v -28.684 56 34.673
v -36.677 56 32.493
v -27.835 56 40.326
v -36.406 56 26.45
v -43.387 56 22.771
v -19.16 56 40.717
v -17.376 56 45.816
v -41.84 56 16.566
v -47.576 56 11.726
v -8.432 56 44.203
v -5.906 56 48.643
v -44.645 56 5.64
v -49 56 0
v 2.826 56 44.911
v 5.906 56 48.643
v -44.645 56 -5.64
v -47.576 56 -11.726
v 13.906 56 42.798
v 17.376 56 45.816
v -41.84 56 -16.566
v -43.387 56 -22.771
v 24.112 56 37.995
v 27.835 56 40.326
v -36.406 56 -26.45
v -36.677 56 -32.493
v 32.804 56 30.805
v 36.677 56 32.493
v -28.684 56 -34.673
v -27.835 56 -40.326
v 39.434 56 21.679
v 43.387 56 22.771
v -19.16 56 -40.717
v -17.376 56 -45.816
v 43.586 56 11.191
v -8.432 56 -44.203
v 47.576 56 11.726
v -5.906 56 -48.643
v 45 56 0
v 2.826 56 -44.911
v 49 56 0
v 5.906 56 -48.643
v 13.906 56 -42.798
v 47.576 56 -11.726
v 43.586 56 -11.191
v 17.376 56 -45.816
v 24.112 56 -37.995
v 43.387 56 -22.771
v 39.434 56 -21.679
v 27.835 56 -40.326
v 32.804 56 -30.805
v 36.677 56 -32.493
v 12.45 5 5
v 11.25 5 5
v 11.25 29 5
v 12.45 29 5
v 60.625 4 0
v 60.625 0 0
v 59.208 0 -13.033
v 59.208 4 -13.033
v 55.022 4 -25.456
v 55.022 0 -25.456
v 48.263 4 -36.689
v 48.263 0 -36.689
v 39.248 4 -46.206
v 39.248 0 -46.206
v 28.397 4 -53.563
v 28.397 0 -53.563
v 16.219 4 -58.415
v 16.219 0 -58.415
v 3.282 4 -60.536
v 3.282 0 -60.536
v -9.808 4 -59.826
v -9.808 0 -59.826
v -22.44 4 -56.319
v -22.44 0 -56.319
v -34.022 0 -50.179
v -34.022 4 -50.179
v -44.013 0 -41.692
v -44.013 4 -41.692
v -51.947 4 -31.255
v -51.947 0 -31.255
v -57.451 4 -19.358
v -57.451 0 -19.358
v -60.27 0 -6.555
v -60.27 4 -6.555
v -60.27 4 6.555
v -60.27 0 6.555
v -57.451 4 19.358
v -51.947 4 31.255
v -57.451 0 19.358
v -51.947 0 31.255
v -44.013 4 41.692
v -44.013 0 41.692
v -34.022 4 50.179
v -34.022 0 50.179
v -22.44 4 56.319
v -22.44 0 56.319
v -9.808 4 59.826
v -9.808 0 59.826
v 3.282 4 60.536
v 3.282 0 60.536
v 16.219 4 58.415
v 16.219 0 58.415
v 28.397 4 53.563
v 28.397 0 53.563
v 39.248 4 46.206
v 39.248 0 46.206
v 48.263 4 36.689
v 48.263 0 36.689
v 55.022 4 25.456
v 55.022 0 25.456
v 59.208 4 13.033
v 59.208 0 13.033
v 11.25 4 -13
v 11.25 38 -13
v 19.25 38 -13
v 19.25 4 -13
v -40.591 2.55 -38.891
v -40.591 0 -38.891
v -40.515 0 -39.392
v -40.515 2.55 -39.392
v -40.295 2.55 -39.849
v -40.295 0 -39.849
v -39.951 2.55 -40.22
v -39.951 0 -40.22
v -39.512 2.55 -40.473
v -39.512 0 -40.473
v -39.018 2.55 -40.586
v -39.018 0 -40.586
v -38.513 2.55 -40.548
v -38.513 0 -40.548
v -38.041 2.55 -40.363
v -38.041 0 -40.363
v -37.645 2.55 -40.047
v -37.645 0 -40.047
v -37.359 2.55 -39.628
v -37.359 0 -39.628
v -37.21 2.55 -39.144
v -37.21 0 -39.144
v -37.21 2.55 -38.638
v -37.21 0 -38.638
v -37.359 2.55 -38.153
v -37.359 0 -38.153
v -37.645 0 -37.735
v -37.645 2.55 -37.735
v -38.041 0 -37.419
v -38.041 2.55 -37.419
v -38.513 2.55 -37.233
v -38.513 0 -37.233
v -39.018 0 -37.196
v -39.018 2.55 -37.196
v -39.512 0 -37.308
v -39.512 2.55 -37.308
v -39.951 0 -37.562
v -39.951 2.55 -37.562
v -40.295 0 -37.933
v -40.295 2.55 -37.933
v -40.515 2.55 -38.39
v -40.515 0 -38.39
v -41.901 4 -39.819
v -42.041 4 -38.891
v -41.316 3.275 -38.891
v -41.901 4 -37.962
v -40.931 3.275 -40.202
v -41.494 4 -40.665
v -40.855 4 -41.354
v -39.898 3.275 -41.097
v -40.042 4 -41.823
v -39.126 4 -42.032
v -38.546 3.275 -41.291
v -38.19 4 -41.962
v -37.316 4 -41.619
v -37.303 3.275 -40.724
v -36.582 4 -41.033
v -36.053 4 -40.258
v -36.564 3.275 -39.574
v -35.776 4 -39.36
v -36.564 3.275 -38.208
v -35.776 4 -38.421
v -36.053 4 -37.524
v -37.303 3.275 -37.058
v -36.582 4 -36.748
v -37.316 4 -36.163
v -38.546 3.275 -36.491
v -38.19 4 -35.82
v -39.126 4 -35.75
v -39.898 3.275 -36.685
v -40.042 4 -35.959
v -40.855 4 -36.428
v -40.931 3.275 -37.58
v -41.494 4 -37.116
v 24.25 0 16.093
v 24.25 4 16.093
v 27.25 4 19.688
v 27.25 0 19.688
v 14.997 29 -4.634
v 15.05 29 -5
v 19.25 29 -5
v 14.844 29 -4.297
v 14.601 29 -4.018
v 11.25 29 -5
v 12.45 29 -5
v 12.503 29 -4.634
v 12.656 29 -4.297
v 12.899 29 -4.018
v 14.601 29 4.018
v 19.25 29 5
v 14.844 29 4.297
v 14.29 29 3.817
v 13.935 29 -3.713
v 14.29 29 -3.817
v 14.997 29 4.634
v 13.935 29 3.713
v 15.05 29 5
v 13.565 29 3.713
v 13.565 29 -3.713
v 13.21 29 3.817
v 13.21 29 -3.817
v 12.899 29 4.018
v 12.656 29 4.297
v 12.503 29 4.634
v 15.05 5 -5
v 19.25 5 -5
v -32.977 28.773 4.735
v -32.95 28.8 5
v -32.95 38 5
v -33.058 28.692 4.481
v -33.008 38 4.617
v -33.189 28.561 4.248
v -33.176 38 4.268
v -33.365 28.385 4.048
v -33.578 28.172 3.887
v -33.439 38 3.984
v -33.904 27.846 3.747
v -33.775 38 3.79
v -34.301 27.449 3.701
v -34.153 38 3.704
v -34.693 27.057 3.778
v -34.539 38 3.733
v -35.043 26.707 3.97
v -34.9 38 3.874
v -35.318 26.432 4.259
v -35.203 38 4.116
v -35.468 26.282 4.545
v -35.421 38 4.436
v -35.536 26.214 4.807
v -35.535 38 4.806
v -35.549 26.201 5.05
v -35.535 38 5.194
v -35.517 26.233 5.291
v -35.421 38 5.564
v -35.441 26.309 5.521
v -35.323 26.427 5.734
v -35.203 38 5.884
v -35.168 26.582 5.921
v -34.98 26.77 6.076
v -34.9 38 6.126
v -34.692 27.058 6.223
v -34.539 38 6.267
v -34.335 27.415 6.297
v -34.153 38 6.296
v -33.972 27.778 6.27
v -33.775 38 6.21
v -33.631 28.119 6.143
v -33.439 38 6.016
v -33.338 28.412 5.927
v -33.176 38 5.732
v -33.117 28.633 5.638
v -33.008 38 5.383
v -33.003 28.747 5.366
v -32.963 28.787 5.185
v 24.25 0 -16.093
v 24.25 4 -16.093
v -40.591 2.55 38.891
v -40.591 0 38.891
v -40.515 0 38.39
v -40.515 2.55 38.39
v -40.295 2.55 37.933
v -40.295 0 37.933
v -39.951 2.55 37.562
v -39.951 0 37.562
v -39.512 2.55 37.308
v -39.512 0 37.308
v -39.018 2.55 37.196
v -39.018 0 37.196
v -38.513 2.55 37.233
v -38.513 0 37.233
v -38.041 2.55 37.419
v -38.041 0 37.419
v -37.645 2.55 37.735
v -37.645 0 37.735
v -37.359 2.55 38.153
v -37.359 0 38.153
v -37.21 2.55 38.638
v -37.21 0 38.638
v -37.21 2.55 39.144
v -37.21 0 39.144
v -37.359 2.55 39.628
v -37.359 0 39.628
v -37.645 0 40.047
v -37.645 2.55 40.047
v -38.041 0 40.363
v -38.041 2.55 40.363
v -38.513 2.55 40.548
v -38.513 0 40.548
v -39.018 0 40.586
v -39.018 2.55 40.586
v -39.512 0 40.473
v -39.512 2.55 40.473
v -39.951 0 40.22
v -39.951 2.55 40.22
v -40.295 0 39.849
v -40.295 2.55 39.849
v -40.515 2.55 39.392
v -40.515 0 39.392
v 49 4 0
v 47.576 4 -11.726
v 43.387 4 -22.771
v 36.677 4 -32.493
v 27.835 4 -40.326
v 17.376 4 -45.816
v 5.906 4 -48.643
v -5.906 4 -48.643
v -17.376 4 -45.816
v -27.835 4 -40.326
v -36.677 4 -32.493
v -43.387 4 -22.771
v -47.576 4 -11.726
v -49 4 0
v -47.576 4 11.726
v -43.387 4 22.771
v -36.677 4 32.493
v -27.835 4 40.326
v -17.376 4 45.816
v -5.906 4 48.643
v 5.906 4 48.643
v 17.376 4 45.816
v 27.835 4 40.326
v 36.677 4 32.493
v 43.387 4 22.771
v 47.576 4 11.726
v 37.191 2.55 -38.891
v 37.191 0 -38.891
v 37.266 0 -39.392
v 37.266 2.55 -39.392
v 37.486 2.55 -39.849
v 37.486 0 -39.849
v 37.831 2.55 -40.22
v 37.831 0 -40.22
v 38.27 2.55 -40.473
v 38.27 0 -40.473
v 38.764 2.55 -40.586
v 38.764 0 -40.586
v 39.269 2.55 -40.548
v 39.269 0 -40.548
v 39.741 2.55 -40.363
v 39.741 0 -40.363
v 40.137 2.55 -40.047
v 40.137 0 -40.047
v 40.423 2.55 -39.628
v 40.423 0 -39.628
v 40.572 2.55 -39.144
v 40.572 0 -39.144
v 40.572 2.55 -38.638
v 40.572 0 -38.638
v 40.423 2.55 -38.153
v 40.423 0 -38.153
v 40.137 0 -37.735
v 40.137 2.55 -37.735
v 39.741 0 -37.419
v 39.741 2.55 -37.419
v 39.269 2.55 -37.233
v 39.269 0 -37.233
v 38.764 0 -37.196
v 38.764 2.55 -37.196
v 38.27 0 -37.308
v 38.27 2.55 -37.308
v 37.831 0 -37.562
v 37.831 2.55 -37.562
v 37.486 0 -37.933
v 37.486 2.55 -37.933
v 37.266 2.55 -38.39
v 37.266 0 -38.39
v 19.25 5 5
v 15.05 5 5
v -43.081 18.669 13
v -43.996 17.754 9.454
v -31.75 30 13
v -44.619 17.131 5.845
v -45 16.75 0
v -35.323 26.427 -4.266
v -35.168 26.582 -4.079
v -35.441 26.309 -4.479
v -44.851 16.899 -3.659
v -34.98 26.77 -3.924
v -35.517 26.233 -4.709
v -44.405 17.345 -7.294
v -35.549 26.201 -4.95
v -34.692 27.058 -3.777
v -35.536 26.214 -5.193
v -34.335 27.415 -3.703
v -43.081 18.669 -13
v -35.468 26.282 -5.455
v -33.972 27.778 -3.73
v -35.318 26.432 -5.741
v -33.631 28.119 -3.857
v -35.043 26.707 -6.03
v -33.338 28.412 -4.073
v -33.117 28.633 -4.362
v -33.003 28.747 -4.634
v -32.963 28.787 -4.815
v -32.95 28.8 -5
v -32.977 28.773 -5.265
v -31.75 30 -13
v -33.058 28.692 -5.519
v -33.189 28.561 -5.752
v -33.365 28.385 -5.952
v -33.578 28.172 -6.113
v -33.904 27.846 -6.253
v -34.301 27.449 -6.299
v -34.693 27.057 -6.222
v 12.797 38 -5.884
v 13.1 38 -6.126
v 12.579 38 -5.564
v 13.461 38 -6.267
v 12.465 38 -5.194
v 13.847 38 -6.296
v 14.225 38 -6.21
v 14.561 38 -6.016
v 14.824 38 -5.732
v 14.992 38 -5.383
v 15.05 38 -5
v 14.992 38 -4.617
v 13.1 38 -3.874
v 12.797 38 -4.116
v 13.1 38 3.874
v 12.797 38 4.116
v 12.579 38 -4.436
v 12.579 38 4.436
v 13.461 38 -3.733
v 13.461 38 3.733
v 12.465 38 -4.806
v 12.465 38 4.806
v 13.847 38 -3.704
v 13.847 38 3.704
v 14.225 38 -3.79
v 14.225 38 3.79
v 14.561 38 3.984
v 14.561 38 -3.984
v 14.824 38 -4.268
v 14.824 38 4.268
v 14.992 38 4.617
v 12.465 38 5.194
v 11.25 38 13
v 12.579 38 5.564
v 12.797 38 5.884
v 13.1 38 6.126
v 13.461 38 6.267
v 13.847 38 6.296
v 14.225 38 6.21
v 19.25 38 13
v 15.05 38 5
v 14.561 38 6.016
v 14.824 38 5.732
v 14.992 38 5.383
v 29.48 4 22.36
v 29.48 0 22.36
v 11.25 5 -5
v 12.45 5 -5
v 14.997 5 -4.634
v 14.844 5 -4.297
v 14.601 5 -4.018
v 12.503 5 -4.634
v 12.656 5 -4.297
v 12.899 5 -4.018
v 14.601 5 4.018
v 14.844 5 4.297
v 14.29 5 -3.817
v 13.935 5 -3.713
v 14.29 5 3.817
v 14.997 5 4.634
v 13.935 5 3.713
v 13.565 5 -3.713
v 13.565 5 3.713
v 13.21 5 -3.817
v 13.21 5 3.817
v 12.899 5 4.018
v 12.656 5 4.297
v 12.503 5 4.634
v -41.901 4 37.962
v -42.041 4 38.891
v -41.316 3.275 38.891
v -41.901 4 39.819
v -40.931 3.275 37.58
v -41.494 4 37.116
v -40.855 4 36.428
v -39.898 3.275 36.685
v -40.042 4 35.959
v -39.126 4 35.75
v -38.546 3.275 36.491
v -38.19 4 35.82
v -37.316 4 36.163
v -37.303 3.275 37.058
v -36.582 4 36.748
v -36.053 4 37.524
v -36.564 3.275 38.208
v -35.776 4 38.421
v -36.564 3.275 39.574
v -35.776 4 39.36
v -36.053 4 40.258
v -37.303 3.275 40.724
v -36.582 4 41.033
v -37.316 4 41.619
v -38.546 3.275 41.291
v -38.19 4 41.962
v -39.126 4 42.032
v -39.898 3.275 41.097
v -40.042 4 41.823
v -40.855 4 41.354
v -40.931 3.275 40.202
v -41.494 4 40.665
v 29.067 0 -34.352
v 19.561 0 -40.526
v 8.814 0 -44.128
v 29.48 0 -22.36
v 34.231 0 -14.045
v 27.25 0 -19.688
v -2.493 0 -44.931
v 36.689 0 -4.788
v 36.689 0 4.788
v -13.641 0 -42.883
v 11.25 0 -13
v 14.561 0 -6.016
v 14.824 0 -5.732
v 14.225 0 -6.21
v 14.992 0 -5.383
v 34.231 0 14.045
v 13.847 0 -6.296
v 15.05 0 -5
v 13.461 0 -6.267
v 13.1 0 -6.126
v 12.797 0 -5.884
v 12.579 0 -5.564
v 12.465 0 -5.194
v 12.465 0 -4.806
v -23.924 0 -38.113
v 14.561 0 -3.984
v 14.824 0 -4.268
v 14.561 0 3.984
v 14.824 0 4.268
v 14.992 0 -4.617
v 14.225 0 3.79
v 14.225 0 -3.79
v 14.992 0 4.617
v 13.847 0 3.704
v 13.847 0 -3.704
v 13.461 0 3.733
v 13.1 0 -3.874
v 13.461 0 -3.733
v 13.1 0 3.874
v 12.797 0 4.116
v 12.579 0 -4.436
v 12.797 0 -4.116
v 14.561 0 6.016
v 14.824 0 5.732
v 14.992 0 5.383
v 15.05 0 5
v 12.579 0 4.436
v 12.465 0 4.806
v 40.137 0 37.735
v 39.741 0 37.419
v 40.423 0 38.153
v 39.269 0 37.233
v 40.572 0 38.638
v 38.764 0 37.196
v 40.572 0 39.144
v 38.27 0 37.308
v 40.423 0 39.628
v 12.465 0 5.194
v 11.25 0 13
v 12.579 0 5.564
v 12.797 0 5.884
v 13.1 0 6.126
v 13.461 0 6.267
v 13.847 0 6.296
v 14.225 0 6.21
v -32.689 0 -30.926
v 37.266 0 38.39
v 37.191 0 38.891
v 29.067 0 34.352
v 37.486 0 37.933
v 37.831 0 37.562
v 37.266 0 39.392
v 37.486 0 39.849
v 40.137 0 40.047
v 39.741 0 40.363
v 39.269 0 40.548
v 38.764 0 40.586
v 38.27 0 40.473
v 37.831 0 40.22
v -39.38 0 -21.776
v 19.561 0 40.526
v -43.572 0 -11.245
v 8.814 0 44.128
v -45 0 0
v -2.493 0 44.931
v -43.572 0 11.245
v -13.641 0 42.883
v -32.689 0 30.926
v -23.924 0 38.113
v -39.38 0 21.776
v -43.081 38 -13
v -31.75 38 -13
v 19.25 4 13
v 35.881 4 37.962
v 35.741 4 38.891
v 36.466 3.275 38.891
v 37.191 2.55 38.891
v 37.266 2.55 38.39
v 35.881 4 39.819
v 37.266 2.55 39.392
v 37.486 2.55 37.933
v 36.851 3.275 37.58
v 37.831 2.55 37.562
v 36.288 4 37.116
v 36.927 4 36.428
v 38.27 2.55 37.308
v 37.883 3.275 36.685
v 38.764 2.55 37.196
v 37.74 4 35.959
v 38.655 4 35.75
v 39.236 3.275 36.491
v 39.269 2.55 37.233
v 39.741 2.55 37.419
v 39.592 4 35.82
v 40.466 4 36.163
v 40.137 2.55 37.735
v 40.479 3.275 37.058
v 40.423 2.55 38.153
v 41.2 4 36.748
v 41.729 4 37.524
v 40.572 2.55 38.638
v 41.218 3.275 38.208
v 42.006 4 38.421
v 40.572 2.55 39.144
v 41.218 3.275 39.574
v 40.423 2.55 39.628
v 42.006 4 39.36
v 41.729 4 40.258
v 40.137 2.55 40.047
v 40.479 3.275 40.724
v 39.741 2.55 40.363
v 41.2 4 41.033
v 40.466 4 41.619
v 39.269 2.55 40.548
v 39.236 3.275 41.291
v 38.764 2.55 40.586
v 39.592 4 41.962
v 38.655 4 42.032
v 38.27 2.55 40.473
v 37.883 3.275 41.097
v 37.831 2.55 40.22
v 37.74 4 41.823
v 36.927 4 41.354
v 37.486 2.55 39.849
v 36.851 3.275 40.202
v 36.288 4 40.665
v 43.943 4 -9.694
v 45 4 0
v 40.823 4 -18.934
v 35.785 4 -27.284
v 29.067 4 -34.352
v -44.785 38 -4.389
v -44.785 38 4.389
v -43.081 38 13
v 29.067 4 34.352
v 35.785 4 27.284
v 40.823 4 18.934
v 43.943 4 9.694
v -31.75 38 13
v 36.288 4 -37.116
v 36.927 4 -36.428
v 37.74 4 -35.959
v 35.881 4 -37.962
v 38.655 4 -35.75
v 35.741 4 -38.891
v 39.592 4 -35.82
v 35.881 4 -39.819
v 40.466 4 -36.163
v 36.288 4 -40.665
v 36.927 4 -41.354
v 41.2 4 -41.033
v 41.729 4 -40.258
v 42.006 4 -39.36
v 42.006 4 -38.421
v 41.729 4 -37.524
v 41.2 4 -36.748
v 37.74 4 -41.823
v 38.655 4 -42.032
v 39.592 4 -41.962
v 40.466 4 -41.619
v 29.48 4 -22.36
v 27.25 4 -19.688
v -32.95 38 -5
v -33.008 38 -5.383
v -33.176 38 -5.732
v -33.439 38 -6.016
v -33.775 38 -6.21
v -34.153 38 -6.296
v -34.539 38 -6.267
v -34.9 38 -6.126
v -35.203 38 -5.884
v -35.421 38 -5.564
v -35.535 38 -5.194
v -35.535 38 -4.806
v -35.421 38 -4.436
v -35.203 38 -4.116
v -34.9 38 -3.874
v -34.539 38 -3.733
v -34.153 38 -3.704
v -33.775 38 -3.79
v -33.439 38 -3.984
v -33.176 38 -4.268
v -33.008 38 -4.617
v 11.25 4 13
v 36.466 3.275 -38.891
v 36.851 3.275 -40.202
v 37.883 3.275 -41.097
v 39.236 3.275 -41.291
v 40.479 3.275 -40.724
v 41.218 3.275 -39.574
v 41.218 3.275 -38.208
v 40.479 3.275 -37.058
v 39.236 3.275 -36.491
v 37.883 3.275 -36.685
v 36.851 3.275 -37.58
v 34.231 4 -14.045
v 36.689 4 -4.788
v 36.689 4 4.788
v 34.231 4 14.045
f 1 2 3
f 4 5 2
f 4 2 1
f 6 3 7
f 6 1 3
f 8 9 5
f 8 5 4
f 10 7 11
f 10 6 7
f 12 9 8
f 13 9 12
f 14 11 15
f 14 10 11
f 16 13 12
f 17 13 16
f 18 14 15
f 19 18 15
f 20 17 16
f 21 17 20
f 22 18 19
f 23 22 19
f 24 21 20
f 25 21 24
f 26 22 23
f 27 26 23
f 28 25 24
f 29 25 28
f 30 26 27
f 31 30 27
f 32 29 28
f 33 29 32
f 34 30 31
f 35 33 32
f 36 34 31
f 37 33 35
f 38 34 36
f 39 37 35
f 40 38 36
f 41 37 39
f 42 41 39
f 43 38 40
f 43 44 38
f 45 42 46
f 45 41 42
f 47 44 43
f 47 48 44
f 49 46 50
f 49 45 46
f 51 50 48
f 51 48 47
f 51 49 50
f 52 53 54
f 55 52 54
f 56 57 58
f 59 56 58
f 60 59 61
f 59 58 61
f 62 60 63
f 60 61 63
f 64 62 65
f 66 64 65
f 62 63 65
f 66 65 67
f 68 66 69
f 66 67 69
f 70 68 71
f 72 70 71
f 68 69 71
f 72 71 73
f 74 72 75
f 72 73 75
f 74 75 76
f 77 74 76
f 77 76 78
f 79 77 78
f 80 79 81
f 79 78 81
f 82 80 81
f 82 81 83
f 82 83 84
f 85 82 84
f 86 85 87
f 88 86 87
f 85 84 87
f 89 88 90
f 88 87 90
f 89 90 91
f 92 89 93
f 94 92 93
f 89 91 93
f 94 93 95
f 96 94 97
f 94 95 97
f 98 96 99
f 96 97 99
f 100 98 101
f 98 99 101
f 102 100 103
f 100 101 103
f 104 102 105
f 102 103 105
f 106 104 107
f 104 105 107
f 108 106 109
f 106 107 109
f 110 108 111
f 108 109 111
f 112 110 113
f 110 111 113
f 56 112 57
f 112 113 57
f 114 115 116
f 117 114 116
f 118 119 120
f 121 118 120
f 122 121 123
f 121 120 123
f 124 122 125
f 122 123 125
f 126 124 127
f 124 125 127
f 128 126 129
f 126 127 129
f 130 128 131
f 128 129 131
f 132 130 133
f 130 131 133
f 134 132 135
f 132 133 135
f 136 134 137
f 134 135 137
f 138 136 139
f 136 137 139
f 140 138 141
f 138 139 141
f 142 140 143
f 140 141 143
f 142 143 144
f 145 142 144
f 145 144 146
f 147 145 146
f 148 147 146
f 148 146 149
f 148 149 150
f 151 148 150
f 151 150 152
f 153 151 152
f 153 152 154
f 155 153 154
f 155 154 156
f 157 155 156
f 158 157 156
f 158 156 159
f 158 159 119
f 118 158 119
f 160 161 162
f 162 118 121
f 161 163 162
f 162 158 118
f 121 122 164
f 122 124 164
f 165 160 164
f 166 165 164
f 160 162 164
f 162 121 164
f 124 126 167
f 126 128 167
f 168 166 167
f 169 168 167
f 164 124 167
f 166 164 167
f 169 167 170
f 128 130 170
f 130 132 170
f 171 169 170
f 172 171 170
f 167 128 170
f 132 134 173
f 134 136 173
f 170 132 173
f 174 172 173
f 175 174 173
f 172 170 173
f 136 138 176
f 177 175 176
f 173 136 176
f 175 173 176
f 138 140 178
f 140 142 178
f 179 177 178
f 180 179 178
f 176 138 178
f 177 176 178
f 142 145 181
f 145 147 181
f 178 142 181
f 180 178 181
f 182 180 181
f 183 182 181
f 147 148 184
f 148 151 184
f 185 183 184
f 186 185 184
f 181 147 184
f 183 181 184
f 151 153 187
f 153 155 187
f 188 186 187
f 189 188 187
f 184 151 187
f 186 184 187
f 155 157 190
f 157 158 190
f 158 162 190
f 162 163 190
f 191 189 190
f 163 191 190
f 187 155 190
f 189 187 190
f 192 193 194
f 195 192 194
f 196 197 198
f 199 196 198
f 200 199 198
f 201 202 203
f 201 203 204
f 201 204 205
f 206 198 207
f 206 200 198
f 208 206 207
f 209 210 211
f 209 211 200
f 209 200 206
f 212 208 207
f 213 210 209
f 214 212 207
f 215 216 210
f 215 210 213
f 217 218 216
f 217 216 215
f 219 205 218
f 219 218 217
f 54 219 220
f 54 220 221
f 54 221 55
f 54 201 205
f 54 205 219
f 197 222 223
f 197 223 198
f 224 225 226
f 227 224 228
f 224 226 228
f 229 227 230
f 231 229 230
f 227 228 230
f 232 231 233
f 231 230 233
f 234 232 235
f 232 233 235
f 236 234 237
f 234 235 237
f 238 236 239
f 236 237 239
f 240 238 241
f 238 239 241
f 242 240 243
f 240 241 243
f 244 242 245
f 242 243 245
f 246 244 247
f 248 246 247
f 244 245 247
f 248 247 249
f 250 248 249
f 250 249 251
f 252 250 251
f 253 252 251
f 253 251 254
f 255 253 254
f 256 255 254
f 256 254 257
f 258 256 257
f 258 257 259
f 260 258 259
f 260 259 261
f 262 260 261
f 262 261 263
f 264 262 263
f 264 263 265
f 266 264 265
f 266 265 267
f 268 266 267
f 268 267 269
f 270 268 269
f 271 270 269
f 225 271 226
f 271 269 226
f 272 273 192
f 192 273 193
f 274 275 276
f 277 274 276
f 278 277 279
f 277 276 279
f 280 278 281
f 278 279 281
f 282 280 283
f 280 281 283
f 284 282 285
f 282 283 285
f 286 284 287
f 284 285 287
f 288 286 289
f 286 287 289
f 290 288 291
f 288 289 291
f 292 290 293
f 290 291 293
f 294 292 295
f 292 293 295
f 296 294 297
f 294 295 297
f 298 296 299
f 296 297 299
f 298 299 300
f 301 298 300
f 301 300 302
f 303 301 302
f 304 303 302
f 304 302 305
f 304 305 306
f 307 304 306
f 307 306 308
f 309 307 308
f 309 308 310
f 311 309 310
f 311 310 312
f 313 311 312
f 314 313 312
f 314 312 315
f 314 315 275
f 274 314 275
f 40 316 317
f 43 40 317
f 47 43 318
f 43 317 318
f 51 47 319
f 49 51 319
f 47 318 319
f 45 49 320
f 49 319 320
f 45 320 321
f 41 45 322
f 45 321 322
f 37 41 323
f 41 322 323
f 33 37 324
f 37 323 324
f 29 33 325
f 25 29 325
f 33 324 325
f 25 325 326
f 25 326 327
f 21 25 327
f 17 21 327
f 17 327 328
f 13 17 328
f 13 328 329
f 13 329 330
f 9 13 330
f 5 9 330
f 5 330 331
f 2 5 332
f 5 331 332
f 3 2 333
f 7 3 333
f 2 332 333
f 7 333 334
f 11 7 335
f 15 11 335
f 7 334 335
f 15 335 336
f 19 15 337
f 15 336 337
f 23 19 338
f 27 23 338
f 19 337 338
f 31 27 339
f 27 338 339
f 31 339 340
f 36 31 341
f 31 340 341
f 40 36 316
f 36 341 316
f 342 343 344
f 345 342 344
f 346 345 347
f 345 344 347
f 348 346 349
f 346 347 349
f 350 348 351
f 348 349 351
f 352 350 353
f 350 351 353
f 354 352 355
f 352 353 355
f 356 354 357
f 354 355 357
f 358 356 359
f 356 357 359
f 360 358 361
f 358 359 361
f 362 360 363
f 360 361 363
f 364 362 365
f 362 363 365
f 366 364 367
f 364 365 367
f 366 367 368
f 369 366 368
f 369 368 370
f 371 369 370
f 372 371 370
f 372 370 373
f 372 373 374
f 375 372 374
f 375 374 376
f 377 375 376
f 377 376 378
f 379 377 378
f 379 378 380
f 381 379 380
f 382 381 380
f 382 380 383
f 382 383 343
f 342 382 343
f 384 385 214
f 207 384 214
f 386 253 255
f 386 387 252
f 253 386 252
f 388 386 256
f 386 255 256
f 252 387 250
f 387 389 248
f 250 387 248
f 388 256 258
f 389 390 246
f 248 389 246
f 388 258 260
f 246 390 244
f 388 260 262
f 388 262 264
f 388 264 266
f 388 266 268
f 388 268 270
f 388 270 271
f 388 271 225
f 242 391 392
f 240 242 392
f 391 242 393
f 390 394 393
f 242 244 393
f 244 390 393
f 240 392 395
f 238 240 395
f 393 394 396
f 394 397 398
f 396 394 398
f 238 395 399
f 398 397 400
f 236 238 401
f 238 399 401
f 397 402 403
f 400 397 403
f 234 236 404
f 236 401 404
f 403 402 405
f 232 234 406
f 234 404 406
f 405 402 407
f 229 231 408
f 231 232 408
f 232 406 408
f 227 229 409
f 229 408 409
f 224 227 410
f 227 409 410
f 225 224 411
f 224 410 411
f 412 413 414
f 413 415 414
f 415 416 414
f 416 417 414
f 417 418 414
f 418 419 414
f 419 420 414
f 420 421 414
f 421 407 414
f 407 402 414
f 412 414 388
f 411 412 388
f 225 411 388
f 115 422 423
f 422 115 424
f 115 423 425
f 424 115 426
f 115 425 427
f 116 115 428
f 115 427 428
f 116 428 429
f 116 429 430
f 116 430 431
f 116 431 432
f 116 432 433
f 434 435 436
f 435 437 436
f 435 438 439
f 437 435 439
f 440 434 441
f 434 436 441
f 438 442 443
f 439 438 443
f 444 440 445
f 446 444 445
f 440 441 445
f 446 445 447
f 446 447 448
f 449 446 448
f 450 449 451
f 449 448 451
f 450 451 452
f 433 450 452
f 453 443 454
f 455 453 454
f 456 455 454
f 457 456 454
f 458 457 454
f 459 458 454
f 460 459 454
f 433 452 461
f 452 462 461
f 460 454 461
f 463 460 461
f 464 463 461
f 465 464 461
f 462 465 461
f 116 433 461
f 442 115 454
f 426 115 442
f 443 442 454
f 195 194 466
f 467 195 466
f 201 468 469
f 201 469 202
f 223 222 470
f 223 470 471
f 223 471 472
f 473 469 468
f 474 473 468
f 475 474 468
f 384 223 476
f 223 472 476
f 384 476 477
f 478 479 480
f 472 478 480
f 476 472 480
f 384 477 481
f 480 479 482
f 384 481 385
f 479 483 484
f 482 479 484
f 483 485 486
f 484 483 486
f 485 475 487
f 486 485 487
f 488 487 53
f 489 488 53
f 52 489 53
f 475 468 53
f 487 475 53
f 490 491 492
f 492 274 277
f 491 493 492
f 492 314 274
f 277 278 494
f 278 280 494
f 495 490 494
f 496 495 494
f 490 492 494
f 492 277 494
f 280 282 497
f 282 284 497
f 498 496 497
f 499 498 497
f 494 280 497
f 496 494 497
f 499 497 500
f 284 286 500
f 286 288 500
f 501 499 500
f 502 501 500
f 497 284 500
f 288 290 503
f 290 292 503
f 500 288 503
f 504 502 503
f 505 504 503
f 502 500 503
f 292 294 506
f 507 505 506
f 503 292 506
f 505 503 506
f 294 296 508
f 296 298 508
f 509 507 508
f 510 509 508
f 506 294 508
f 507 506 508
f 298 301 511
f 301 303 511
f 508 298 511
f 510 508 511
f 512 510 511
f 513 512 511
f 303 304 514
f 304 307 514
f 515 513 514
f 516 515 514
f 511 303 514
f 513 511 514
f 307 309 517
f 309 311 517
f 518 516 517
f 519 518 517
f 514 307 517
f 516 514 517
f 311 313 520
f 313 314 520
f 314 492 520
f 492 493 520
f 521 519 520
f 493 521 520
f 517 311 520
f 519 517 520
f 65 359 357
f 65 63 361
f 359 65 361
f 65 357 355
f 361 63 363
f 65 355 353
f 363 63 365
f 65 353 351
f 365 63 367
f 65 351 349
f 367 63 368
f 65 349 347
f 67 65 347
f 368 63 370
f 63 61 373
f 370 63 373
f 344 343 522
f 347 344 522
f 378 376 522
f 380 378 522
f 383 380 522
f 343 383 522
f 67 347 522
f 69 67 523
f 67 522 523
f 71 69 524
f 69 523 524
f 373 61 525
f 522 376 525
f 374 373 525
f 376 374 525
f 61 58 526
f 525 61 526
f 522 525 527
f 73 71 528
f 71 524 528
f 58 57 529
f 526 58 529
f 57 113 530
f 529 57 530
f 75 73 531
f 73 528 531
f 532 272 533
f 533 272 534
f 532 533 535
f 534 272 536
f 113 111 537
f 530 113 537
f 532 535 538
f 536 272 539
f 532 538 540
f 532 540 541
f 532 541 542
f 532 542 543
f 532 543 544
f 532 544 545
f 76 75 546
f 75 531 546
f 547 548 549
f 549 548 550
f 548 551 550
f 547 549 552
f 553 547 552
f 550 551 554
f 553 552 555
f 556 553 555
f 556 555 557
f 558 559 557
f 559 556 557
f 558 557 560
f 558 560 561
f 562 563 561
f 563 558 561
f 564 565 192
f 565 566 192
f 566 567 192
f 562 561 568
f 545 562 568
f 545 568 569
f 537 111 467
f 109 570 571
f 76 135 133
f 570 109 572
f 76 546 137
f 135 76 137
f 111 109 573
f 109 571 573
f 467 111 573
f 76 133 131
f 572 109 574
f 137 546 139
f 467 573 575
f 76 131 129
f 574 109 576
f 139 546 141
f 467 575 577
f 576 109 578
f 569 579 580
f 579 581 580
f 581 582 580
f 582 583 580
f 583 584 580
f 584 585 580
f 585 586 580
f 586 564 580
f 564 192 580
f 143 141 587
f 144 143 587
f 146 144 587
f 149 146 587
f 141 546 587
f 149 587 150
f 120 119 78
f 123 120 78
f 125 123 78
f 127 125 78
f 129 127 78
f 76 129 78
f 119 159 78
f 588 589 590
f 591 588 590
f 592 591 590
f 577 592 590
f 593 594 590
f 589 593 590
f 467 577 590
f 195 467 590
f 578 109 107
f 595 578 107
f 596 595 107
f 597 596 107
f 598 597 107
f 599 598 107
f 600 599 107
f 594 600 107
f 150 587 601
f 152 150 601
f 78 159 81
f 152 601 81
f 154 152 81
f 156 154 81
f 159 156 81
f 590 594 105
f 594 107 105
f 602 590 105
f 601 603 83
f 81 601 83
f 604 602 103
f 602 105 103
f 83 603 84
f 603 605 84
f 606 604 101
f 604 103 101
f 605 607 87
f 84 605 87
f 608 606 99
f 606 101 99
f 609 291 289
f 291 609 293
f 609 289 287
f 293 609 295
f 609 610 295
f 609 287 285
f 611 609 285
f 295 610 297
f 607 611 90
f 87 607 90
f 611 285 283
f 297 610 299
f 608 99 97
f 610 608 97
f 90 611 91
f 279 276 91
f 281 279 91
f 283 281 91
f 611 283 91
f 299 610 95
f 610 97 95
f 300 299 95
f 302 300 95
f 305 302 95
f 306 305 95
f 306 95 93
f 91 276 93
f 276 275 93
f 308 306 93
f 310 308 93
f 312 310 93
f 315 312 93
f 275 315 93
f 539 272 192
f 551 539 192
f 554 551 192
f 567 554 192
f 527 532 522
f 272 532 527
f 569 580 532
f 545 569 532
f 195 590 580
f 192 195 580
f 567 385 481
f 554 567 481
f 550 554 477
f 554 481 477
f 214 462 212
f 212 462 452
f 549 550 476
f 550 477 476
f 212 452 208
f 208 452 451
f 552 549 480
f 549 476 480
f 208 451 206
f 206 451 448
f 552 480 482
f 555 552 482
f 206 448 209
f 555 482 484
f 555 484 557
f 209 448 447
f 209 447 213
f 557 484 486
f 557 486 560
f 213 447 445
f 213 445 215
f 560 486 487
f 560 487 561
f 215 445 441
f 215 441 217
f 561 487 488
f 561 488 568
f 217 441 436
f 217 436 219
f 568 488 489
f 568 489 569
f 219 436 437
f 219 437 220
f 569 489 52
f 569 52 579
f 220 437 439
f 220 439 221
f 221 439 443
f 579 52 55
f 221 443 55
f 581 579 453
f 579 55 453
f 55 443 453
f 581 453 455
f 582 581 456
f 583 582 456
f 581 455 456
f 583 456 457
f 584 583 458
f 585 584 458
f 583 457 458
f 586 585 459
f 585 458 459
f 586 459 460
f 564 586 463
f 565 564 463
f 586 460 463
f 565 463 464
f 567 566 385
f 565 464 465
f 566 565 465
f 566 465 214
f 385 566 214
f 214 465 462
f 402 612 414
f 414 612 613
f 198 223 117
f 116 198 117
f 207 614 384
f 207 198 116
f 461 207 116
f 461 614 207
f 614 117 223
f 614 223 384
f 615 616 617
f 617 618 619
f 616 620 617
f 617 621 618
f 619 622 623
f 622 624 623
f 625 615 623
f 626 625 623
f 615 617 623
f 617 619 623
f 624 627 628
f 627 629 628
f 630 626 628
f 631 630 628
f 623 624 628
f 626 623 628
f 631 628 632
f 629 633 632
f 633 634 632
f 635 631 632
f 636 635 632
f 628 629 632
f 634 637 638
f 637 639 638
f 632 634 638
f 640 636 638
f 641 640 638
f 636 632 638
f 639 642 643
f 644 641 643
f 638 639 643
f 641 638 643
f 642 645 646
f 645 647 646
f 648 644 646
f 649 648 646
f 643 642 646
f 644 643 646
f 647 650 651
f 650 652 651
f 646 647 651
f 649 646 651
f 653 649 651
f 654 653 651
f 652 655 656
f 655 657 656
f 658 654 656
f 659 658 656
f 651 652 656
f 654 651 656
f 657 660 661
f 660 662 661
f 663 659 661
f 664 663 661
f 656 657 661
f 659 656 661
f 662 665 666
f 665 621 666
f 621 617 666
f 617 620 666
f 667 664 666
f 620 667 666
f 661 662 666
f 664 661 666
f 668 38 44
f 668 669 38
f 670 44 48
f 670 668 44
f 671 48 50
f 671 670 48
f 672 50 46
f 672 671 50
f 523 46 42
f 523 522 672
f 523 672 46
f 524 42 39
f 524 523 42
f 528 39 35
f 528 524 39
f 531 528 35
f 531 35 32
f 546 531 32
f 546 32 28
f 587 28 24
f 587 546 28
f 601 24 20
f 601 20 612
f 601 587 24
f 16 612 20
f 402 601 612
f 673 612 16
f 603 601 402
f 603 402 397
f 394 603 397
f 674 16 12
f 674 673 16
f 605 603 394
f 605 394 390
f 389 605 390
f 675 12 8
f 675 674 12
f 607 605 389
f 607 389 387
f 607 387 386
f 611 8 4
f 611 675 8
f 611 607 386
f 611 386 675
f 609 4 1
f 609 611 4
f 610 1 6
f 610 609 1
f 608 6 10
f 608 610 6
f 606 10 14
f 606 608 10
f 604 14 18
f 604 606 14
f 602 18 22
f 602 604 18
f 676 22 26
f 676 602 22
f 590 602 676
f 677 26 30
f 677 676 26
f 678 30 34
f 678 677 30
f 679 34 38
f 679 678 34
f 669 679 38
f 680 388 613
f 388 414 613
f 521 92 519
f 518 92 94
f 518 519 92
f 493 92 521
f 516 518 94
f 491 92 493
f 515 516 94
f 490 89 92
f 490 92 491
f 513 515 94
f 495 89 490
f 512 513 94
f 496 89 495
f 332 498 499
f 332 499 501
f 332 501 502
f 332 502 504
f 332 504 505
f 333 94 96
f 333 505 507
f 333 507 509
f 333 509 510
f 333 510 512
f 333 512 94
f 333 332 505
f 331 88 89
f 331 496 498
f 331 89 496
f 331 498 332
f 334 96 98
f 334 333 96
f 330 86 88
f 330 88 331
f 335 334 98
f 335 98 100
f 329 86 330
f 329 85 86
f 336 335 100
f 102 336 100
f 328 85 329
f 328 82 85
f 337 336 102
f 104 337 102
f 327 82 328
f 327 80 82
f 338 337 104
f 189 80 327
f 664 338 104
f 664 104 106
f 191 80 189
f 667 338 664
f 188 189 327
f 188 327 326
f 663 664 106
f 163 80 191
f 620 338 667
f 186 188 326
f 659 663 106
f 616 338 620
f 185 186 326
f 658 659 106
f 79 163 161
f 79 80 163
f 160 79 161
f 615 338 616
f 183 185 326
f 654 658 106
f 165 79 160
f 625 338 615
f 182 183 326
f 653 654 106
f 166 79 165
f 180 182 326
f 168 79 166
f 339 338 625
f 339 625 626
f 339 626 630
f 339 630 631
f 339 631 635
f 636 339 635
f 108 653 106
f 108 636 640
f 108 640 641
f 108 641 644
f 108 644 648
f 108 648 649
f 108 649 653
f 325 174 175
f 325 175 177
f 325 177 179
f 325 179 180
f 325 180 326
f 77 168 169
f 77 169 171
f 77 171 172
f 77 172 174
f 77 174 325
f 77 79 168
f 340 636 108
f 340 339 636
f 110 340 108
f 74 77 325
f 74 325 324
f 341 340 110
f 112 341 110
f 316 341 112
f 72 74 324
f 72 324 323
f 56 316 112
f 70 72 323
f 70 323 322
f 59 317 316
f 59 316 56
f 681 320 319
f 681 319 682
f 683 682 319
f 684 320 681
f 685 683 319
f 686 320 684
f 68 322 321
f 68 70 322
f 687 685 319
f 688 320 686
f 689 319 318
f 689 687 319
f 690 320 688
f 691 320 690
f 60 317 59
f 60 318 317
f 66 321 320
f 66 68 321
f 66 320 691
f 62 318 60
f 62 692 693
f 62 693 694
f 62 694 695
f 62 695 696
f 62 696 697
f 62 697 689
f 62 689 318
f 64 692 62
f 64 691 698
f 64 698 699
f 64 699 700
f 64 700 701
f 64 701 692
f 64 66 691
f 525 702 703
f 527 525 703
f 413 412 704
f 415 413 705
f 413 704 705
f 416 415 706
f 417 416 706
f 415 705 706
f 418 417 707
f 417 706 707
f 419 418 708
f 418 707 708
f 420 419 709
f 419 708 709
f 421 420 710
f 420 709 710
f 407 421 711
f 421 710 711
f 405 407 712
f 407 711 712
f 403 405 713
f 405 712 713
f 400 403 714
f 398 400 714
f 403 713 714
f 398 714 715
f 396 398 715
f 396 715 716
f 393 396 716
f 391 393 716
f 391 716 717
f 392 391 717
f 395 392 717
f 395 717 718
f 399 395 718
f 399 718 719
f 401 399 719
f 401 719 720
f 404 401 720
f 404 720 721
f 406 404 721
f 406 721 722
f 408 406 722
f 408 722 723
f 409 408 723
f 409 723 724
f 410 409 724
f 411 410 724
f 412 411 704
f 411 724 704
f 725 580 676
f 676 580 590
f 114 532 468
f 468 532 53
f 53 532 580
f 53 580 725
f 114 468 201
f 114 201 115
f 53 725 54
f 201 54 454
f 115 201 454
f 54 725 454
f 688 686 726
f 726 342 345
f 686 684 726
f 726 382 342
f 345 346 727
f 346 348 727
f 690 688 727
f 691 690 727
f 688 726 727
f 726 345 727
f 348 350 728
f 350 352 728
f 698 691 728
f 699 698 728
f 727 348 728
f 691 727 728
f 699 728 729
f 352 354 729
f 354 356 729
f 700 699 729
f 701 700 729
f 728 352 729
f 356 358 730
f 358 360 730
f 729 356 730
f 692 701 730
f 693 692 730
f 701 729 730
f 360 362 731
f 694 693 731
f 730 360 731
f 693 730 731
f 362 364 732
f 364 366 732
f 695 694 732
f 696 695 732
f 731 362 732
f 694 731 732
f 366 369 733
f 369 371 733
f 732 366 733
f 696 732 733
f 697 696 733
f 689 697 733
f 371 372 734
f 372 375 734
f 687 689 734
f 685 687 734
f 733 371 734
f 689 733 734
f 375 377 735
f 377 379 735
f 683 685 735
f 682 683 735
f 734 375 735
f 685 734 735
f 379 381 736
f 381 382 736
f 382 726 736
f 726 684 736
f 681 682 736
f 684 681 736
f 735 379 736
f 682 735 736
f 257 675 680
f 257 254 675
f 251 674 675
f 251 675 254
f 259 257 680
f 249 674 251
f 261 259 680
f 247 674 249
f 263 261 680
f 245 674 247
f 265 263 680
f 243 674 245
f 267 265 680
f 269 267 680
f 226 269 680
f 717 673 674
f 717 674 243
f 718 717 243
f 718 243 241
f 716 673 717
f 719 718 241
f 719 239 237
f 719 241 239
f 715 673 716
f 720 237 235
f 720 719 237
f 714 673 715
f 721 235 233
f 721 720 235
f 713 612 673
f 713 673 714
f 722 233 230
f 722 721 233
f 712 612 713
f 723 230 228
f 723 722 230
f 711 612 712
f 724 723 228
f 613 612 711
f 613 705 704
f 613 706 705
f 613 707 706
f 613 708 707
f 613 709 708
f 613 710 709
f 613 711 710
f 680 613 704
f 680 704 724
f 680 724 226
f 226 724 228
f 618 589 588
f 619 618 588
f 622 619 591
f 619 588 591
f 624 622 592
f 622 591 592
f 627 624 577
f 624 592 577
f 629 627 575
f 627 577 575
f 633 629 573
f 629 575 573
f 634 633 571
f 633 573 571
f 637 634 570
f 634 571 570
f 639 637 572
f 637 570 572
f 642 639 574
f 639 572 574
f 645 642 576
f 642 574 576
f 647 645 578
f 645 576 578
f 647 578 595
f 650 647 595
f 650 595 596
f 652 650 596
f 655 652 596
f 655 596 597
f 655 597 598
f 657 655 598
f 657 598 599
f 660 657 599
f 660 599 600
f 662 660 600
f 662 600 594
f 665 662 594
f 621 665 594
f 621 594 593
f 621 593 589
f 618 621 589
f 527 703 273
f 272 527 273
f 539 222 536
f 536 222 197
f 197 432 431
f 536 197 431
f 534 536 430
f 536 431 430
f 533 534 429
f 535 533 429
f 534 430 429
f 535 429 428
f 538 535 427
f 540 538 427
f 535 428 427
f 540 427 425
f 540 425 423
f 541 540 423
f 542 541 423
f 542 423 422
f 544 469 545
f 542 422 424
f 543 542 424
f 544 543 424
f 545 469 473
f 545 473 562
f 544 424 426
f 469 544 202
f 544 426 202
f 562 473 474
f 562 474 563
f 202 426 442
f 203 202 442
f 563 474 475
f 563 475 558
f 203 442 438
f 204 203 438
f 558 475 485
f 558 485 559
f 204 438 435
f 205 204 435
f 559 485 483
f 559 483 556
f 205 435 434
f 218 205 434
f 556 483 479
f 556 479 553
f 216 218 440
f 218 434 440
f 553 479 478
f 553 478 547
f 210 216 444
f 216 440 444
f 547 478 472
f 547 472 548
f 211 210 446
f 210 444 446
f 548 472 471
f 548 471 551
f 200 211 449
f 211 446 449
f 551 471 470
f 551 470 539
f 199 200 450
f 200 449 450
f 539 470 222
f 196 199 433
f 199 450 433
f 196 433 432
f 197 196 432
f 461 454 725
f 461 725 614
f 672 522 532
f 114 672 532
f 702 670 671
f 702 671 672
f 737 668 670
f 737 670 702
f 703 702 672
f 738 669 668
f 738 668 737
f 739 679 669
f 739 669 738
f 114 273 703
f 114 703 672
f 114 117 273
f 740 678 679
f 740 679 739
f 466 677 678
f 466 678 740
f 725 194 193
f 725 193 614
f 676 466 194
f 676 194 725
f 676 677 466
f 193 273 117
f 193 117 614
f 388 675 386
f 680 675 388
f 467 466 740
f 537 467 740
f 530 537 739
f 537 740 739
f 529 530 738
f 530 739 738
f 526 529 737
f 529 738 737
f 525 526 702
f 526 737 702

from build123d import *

# Parameters (mm, degrees)
SKETCH1_R                                           = 60.625
SKETCH1_R_2                                         = 45
BOSS_EXTRUDE1_DEPTH                                 = 4
SKETCH2_R                                           = 49
SKETCH2_R_2                                         = 45
BOSS_EXTRUDE2_DEPTH                                 = 52
SKETCH4_W                                           = 13.25
SKETCH4_H                                           = 8
SKETCH4_W_2                                         = 8
SKETCH4_H_2                                         = 38
BOSS_EXTRUDE4_DEPTH                                 = 13
BOSS_EXTRUDE5_DEPTH                                 = 4
SKETCH7_R                                           = 1.3
CUT_EXTRUDE4_DEPTH                                  = 39
SKETCH9_W                                           = 10
SKETCH9_H                                           = 24
CUT_EXTRUDE7_DEPTH                                  = 8
CUT_EXTRUDE9_DEPTH                                  = 5
CSK_FOR_M3_COUNTERSUNK_FLAT_HEAD_SCREW1_D           = 3.4
CSK_FOR_M3_COUNTERSUNK_FLAT_HEAD_SCREW1_DEPTH       = 4
CSK_FOR_M3_COUNTERSUNK_FLAT_HEAD_SCREW1_CSINK_D     = 6.3
CSK_FOR_M3_COUNTERSUNK_FLAT_HEAD_SCREW1_CSINK_ANGLE = 90


with BuildPart() as part:
    # Sketch1 → Boss-Extrude1 (new body)
    with BuildSketch(Plane(origin=(0, 0, 0), x_dir=(1, 0, 0), z_dir=(0, 1, 0))):
        Circle(SKETCH1_R)
        Circle(SKETCH1_R_2, mode=Mode.SUBTRACT)
    extrude(amount=BOSS_EXTRUDE1_DEPTH)

    # Sketch2 → Boss-Extrude2 (add)
    with BuildSketch(Plane(origin=(0, 4, 0), x_dir=(1, 0, 0), z_dir=(0, 1, 0))):
        Circle(SKETCH2_R)
        Circle(SKETCH2_R_2, mode=Mode.SUBTRACT)
    extrude(amount=BOSS_EXTRUDE2_DEPTH)

    # Sketch4 → Boss-Extrude4 (add, symmetric)
    with BuildSketch(Plane.XY):
        with Locations((-38.375, 34)):
            Rectangle(SKETCH4_W, SKETCH4_H)
        Polygon((-31.75, 30), (-45, 30), (-45, 16.75), align=None)
        with Locations((15.25, 19)):
            Rectangle(SKETCH4_W_2, SKETCH4_H_2)
    extrude(amount=BOSS_EXTRUDE4_DEPTH, both=True)

    # Sketch5 → Boss-Extrude5 (add)
    with BuildSketch(Plane.XZ):
        with BuildLine():
            Line((11.25, 13), (29.067400866, 34.352382842))
            ThreePointArc((29.067400866, 34.352382842), (45, 0), (29.067400866, -34.352382842))
            Line((29.067400866, -34.352382842), (11.25, -13))
            Line((11.25, -13), (11.25, 13))
        make_face()
    extrude(amount=-BOSS_EXTRUDE5_DEPTH)

    # Sketch7 → Cut-Extrude4 (cut, through all)
    with BuildSketch(Plane(origin=(0, 38, 0), x_dir=(1, 0, 0), z_dir=(0, 1, 0))):
        with Locations((-34.25, 5)):
            Circle(SKETCH7_R)
        with Locations((-34.25, -5)):
            Circle(SKETCH7_R)
        with Locations((13.75, 5)):
            Circle(SKETCH7_R)
        with Locations((13.75, -5)):
            Circle(SKETCH7_R)
    extrude(amount=-CUT_EXTRUDE4_DEPTH, mode=Mode.SUBTRACT)

    # Sketch9 → Cut-Extrude7 (cut)
    with BuildSketch(Plane.ZY.offset(-11.25)):
        with Locations((0, 17)):
            Rectangle(SKETCH9_W, SKETCH9_H)
    extrude(amount=-CUT_EXTRUDE7_DEPTH, mode=Mode.SUBTRACT)

    # Sketch12 → Cut-Extrude9 (cut, through all)
    with BuildSketch(Plane(origin=(0, 4, 0), x_dir=(1, 0, 0), z_dir=(0, 1, 0))):
        with BuildLine():
            Line((29.479537487, 22.359715328), (27.25, 19.687836398))
            Line((27.25, 19.687836398), (27.25, -19.687836398))
            Line((27.25, -19.687836398), (29.479537487, -22.359715328))
            ThreePointArc((29.479537487, -22.359715328), (37, 0), (29.479537487, 22.359715328))
        make_face()
        Polygon((27.25, -19.687836398), (27.25, 19.687836398), (24.25, 16.092634774), (24.25, -16.092634774), align=None)
    extrude(amount=-CUT_EXTRUDE9_DEPTH, mode=Mode.SUBTRACT)

    # CSK for M3 Countersunk Flat Head Screw1
    with Locations(Plane(origin=(0, 4, 0), x_dir=(1, 0, 0), z_dir=(0, 1, 0))):
        with Locations((-38.890872965, 38.890872965), (-38.890872965, -38.890872965), (38.890872965, -38.890872965), (38.890872965, 38.890872965)):
            CounterSinkHole(CSK_FOR_M3_COUNTERSUNK_FLAT_HEAD_SCREW1_D / 2, CSK_FOR_M3_COUNTERSUNK_FLAT_HEAD_SCREW1_CSINK_D / 2, depth=CSK_FOR_M3_COUNTERSUNK_FLAT_HEAD_SCREW1_DEPTH, counter_sink_angle=CSK_FOR_M3_COUNTERSUNK_FLAT_HEAD_SCREW1_CSINK_ANGLE)


solid = part.part
